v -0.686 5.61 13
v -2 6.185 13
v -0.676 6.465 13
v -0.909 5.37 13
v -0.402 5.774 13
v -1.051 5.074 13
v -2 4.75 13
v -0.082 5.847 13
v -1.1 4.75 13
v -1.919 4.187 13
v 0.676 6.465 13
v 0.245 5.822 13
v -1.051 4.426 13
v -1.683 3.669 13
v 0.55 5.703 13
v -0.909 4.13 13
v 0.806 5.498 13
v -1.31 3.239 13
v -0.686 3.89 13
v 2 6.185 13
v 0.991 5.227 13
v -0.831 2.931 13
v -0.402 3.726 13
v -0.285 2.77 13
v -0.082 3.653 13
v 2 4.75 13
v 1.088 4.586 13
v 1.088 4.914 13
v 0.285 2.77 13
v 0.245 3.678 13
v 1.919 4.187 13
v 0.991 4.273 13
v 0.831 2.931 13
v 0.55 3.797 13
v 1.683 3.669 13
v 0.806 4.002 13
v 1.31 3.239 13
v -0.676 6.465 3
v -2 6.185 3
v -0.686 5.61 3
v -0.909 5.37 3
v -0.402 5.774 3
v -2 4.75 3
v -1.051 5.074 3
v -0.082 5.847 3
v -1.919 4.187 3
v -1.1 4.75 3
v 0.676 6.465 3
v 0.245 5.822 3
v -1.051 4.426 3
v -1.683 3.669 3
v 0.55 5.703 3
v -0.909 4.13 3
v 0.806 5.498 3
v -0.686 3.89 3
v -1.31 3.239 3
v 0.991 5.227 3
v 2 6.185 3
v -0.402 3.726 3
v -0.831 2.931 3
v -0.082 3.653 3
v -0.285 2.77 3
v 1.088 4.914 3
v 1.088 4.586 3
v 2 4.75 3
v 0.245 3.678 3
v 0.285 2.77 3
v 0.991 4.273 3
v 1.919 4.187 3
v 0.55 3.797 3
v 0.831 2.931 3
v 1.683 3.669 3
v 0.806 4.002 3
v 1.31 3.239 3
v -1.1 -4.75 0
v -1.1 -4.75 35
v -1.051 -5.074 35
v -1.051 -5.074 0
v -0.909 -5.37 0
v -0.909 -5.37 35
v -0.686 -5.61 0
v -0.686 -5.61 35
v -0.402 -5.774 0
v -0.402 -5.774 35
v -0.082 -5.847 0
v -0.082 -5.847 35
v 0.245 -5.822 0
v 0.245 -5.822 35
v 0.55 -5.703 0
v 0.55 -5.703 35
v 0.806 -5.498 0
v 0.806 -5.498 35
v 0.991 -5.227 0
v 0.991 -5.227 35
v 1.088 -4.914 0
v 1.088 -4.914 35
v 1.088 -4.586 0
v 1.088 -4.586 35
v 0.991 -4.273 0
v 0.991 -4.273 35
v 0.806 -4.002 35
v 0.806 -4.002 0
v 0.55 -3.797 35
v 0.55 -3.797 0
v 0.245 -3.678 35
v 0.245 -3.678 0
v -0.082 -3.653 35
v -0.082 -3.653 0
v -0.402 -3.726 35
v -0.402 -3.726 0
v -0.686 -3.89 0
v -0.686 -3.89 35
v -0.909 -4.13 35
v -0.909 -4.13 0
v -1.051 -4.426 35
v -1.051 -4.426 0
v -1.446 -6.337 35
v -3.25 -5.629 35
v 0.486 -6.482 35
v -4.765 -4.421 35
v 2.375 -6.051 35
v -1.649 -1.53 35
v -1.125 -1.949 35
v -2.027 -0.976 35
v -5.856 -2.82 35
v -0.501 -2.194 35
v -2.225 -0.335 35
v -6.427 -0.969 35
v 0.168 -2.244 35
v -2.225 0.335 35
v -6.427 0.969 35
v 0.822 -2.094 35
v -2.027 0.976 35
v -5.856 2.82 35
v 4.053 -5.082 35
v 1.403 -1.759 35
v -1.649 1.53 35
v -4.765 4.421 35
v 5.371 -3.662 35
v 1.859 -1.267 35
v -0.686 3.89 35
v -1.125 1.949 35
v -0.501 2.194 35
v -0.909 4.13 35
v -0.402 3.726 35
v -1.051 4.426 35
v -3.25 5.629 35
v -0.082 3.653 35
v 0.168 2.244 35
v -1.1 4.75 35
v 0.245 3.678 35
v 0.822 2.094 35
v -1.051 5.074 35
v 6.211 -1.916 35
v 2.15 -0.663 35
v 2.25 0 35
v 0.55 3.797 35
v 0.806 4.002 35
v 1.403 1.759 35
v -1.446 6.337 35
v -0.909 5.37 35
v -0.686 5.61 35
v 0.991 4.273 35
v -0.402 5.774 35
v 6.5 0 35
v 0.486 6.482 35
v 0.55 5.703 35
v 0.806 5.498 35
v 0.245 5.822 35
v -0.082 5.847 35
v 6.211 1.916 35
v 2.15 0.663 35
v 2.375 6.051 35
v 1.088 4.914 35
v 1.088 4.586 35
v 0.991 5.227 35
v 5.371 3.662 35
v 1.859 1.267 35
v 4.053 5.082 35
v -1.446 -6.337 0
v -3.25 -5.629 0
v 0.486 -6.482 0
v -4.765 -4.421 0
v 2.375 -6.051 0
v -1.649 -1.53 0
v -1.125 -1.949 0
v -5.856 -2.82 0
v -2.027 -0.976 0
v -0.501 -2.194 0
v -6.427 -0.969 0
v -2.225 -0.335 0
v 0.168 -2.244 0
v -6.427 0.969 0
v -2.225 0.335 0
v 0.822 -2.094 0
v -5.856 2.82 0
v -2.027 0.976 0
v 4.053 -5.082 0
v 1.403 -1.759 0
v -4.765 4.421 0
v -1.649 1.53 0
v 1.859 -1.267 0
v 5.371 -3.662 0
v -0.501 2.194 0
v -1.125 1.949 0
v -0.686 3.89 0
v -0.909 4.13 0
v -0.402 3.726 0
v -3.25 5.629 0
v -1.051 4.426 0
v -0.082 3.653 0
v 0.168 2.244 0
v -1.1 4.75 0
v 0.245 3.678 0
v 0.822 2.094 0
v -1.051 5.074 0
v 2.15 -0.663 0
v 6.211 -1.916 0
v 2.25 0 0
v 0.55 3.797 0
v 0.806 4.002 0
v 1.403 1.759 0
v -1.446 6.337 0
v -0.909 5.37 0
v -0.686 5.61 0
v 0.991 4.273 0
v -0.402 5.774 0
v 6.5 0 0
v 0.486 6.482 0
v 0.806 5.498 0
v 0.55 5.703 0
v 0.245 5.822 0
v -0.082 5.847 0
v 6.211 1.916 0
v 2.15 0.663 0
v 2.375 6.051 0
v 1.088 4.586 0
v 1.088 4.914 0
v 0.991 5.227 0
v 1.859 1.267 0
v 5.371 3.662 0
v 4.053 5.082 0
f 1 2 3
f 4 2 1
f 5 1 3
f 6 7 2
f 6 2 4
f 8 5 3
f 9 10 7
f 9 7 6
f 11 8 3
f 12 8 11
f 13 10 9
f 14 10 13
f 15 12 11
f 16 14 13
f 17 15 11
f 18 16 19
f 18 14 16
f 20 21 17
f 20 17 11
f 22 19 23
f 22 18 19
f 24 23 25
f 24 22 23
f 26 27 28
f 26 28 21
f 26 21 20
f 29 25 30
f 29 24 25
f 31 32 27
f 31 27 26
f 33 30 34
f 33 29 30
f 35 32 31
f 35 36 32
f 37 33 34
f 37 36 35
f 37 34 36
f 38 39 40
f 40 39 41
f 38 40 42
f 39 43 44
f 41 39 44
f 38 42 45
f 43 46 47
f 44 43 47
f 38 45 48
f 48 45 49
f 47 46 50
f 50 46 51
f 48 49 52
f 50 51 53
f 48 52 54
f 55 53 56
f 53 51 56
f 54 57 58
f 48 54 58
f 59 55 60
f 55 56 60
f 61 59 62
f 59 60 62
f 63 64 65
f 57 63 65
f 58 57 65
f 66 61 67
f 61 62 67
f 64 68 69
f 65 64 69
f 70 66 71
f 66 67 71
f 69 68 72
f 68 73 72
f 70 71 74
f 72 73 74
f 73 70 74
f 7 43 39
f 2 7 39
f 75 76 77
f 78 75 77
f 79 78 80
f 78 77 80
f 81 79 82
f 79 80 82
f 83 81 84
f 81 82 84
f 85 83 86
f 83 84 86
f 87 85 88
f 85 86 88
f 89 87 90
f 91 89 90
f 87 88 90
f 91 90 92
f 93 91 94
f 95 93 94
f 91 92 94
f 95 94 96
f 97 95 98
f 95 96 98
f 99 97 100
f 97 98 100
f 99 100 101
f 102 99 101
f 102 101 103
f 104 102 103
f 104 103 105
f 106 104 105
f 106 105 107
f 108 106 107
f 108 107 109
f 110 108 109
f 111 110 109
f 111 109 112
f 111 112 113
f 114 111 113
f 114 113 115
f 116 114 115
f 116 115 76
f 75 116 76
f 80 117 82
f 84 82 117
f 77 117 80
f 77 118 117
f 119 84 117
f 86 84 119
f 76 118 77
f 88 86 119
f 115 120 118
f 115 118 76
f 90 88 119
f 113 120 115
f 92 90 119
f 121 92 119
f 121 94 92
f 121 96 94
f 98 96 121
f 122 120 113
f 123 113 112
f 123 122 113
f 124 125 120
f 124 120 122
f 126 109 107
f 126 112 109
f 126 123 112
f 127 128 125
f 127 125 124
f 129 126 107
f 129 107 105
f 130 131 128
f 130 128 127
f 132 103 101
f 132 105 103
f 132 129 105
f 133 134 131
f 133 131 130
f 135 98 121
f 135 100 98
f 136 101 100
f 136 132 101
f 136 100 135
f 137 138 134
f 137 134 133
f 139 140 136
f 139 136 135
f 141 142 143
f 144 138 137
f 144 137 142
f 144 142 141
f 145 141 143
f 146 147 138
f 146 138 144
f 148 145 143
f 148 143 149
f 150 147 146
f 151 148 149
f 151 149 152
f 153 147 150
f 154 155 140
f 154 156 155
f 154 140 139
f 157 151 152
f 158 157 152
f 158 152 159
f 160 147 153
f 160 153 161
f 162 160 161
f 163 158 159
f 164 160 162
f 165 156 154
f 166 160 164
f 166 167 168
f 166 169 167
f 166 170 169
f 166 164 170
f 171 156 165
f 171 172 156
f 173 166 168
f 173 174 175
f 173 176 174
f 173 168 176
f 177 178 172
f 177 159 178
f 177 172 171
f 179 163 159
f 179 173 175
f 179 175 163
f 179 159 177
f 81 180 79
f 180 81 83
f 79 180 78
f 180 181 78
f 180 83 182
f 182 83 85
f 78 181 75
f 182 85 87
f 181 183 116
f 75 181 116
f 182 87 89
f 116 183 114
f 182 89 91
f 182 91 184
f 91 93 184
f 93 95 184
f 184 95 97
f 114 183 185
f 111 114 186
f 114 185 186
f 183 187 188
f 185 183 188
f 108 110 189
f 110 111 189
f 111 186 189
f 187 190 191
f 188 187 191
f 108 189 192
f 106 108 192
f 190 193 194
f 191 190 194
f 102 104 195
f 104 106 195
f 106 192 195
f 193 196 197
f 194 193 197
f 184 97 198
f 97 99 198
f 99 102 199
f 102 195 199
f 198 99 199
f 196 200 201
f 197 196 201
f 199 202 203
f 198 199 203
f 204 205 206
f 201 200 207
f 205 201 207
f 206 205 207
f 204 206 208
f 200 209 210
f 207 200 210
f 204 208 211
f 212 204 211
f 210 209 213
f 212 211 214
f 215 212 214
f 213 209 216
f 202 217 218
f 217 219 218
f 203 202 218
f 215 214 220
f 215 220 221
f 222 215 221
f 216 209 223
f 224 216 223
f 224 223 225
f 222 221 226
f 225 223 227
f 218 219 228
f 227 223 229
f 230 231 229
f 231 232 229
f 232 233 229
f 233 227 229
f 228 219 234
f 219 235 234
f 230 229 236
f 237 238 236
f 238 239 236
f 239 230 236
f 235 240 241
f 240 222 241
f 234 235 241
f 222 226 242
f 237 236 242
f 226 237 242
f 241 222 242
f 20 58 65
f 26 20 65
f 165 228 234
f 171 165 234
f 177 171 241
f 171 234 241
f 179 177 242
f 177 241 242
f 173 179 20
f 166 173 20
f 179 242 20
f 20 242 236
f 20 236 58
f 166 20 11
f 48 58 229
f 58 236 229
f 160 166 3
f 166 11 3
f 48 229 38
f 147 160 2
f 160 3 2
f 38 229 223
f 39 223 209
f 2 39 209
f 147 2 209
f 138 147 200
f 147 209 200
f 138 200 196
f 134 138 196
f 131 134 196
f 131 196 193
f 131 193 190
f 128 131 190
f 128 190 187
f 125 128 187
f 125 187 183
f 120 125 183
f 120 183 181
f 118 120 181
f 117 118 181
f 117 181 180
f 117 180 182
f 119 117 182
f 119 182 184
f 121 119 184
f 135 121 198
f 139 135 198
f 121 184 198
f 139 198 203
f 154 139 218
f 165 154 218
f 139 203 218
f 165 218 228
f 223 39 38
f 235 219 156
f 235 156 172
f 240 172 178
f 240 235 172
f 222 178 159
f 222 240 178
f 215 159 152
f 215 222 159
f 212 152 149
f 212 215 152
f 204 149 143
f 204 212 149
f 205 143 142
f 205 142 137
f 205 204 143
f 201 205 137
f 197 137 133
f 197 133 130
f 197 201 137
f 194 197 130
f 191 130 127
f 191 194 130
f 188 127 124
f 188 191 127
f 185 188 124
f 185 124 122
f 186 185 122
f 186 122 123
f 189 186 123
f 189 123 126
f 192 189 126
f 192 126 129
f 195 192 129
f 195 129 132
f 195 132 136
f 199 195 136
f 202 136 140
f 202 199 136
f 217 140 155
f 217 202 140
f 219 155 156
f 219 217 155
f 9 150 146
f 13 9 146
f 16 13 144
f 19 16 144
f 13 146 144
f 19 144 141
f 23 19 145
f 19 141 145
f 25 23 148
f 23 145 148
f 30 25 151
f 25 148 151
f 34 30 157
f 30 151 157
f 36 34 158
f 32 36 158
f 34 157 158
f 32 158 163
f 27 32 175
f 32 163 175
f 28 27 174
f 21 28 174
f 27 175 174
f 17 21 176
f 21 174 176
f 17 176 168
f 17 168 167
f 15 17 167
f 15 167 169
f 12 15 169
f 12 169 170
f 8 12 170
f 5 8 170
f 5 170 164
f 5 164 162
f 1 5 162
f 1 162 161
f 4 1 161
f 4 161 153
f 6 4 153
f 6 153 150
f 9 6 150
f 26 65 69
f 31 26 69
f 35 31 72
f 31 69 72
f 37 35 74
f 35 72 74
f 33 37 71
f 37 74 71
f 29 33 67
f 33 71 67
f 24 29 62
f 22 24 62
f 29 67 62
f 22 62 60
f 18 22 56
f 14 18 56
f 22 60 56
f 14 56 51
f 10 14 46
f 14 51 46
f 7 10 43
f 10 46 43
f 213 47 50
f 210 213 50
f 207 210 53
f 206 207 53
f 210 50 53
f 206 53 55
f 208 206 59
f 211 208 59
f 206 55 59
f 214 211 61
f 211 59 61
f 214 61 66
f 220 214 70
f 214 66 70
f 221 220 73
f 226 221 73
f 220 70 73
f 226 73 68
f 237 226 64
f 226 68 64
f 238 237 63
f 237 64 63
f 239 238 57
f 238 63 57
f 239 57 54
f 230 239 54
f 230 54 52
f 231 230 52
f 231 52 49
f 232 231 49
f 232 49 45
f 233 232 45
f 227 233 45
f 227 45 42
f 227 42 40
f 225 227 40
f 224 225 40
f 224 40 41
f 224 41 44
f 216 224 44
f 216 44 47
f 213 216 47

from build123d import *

# Parameters (mm, degrees)
F0_R     = 6.5
F0_R_2   = 2.25
F1_DEPTH = 35
F3_D     = 2.2
F7_DEPTH = 10


with BuildPart() as f1:
    # F0 (on Top) → F1 (new body)
    with BuildSketch(Plane.XY):
        Circle(F0_R)
        Circle(F0_R_2, mode=Mode.SUBTRACT)
    extrude(amount=F1_DEPTH)

    # F3 (through all)
    with Locations(Plane(origin=(0, 0, 0), x_dir=(1, 0, 0), z_dir=(0, 0, -1))):
        with Locations((0, -4.75), (0, 4.75)):
            Hole(F3_D / 2)

    # F6 (on offset) → F7 (cut)
    with BuildSketch(Plane(origin=(0, 0, 3), x_dir=(1, 0, 0), z_dir=(0, 0, -1))):
        with BuildLine():
            Line((2, -6.75), (2, -4.75))
            ThreePointArc((2, -4.75), (0, -2.75), (-2, -4.75))
            Line((-2, -4.75), (-2, -6.75))
            Line((-2, -6.75), (2, -6.75))
        make_face()
    extrude(amount=-F7_DEPTH, mode=Mode.SUBTRACT)


solid = f1.part
